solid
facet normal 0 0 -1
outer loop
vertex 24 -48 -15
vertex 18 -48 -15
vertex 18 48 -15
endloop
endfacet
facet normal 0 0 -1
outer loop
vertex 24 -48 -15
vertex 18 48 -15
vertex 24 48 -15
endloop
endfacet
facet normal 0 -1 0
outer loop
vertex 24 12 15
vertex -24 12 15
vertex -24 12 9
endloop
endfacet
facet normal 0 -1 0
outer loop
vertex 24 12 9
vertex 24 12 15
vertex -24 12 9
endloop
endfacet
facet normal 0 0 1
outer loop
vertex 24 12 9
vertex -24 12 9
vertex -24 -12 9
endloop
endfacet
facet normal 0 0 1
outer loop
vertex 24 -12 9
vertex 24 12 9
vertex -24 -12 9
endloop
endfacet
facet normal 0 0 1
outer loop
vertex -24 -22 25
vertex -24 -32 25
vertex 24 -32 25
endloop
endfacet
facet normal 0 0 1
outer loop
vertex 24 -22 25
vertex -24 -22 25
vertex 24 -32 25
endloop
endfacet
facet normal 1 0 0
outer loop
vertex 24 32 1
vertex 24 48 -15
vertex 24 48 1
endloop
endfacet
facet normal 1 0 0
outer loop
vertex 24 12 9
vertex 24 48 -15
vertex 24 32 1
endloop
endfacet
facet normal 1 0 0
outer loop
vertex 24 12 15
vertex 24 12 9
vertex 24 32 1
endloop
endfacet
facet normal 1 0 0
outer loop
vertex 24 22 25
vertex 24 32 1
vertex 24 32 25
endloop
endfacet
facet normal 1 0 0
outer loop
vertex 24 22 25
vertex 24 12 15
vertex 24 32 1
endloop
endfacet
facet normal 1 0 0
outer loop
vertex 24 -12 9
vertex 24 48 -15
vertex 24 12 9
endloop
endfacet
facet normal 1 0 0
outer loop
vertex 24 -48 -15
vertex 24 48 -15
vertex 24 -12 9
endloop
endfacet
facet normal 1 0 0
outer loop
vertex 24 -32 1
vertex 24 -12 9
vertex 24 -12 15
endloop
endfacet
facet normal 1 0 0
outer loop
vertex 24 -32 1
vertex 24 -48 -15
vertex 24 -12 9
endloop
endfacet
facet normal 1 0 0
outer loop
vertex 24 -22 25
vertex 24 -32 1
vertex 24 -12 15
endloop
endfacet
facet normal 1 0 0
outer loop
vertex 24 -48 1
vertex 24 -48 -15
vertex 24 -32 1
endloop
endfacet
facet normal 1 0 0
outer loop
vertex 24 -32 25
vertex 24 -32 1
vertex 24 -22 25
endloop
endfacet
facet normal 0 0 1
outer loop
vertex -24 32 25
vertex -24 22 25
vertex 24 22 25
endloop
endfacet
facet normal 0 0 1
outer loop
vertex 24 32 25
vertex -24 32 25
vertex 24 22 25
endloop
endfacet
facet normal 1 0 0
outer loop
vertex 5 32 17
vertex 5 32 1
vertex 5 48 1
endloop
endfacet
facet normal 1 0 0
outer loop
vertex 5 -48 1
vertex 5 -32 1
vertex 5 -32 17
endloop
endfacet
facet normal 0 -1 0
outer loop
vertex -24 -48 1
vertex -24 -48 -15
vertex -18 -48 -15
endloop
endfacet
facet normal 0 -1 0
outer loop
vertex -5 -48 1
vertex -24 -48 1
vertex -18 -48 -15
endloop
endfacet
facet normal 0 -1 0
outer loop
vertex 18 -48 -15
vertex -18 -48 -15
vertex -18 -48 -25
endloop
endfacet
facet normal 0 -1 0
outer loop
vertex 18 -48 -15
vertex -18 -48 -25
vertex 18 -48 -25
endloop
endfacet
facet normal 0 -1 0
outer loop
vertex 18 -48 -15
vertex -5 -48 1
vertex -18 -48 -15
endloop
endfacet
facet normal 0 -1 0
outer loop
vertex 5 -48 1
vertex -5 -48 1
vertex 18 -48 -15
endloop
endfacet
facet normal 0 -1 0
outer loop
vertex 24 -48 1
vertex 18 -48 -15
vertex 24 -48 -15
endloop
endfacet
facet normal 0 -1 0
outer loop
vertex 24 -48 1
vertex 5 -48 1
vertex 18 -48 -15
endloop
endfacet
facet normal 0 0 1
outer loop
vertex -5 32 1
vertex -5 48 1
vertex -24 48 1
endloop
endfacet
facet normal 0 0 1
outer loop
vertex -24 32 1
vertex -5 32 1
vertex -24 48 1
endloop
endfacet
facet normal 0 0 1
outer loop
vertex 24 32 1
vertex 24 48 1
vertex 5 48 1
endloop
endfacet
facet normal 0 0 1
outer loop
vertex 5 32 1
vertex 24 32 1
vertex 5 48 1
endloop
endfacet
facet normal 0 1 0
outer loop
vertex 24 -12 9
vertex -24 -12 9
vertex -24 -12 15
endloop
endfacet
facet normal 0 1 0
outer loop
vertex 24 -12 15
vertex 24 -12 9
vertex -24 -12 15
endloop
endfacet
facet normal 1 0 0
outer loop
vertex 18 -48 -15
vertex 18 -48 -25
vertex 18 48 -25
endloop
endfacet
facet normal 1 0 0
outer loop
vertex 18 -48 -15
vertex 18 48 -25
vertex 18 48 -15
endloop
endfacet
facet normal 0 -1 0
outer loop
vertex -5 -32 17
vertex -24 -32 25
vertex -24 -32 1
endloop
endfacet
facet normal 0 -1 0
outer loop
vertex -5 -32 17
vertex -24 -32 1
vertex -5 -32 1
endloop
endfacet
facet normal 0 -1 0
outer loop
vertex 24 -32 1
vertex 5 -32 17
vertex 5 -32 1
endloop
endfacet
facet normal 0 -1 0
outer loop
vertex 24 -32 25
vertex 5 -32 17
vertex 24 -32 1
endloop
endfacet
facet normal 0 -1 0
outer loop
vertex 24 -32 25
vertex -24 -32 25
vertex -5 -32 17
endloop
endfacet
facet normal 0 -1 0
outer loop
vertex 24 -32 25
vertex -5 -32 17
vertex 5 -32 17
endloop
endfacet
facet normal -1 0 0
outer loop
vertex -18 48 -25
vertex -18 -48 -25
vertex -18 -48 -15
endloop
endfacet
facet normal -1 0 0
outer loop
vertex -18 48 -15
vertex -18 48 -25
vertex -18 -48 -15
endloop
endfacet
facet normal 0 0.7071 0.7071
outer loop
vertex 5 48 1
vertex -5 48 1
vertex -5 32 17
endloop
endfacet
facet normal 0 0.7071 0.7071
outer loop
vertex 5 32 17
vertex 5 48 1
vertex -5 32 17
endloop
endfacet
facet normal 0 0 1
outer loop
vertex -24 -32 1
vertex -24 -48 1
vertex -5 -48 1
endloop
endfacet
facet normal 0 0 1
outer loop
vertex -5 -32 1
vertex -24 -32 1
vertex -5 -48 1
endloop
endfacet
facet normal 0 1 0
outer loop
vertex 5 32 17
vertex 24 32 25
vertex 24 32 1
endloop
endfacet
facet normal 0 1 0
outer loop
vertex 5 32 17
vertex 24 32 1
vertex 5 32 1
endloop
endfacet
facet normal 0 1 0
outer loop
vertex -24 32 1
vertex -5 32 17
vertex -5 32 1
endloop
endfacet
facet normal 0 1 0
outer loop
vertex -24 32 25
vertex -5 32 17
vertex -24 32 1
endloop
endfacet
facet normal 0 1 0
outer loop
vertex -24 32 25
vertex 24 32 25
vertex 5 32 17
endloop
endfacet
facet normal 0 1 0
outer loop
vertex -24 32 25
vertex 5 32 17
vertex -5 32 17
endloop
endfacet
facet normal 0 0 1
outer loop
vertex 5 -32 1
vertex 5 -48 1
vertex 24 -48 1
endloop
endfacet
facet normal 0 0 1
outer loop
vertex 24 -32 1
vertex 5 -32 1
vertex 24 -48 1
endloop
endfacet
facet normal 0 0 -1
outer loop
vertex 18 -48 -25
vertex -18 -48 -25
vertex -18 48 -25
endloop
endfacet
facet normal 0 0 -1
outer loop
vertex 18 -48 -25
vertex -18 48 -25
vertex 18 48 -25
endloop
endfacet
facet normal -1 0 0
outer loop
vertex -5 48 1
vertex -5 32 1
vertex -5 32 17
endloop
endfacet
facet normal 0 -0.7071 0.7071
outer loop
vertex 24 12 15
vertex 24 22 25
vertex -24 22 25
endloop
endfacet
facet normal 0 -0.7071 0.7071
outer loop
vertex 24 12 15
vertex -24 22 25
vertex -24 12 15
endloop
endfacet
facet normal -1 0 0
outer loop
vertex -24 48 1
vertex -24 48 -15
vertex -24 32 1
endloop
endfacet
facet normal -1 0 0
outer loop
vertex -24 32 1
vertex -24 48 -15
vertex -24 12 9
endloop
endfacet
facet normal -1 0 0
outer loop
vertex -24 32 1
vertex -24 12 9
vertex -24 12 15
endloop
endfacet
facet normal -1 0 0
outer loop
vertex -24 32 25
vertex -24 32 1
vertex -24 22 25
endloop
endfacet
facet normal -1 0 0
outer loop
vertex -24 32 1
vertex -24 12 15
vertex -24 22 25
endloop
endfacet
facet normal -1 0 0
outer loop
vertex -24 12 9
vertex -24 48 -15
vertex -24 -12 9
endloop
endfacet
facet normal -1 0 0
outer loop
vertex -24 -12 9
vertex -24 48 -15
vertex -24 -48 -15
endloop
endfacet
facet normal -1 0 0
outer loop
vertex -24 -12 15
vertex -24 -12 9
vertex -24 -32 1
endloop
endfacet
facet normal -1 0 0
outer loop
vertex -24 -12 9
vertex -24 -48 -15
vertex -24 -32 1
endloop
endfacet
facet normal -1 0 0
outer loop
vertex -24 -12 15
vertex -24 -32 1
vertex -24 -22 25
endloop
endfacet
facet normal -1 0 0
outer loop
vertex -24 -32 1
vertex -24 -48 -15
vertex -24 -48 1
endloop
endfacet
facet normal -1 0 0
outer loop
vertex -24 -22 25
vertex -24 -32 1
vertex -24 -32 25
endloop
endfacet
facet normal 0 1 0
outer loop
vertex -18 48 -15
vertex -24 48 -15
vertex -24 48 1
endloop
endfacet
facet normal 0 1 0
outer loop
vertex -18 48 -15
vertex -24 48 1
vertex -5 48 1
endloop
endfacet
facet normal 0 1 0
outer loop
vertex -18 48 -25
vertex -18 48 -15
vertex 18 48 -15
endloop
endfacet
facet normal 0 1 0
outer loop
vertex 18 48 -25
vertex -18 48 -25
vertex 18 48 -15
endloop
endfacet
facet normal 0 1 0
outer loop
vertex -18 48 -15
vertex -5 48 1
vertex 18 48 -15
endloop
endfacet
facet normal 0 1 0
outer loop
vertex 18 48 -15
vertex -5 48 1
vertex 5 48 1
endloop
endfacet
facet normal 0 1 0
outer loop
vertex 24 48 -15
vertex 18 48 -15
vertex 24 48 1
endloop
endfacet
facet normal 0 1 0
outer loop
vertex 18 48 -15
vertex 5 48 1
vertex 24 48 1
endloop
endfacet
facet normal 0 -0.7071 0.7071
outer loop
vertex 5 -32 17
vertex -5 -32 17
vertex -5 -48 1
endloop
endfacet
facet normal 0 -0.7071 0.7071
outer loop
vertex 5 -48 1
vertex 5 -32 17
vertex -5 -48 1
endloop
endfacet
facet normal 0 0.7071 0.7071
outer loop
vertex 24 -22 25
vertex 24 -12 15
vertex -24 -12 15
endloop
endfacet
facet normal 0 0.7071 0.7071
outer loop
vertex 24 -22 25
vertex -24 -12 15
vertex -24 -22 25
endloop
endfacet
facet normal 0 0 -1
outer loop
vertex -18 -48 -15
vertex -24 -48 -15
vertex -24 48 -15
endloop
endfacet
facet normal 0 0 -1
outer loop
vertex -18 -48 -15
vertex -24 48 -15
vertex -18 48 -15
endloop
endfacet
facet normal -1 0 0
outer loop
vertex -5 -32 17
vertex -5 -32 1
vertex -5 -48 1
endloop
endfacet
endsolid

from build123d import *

# Parameters (mm, degrees)
F0_W      = 48
F0_H      = 50
F1_DEPTH  = 48
F2_W      = 6
F2_H      = 10
F3_DEPTH  = 96.001
F4_W      = 19
F4_H      = 24
F5_DEPTH  = 16
F7_DEPTH  = 29.001
F9_DEPTH  = 48.001
F10_W     = 19
F10_H     = 24
F11_DEPTH = 16
F13_DEPTH = 29.001


with BuildPart() as f1:
    # F0 (on Front) → F1 (new body, symmetric)
    with BuildSketch(Plane.XZ):
        Rectangle(F0_W, F0_H)
    extrude(amount=F1_DEPTH, both=True)

    # F2 (on face) → F3 (cut, through all)
    with BuildSketch(Plane.XZ.offset(48)):
        with Locations((-21, -20)):
            Rectangle(F2_W, F2_H)
        with Locations((21, -20)):
            Rectangle(F2_W, F2_H)
    extrude(amount=-F3_DEPTH, mode=Mode.SUBTRACT)

    # F4 (on face) → F5 (cut)
    with BuildSketch(Plane.XZ.offset(48)):
        with Locations((-14.5, 13)):
            Rectangle(F4_W, F4_H)
        with Locations((14.5, 13)):
            Rectangle(F4_W, F4_H)
    extrude(amount=-F5_DEPTH, mode=Mode.SUBTRACT)

    # F6 (on face) → F7 (cut, through all)
    with BuildSketch(Plane(origin=(-5, 0, 0), x_dir=(0, -1, 0), z_dir=(-1, 0, 0))):
        Polygon((32, 17), (48, 1), (48, 25), (32, 25), align=None)
    extrude(amount=-F7_DEPTH, mode=Mode.SUBTRACT)

    # F8 (on face) → F9 (cut, through all)
    with BuildSketch(Plane(origin=(-24, 0, 0), x_dir=(0, -1, 0), z_dir=(-1, 0, 0))):
        Polygon((12, 15), (22, 25), (-22, 25), (-12, 15), (-12, 9), (12, 9), align=None)
    extrude(amount=-F9_DEPTH, mode=Mode.SUBTRACT)

    # F10 (on face) → F11 (cut)
    with BuildSketch(Plane(origin=(0, 48, 0), x_dir=(-1, 0, 0), z_dir=(0, 1, 0))):
        with Locations((-14.5, 13)):
            Rectangle(F10_W, F10_H)
        with Locations((14.5, 13)):
            Rectangle(F10_W, F10_H)
    extrude(amount=-F11_DEPTH, mode=Mode.SUBTRACT)

    # F12 (on face) → F13 (cut, through all)
    with BuildSketch(Plane(origin=(-5, 0, 0), x_dir=(0, -1, 0), z_dir=(-1, 0, 0))):
        Polygon((-48, 1), (-32, 17), (-32, 25), (-48, 25), align=None)
    extrude(amount=-F13_DEPTH, mode=Mode.SUBTRACT)


solid = f1.part
